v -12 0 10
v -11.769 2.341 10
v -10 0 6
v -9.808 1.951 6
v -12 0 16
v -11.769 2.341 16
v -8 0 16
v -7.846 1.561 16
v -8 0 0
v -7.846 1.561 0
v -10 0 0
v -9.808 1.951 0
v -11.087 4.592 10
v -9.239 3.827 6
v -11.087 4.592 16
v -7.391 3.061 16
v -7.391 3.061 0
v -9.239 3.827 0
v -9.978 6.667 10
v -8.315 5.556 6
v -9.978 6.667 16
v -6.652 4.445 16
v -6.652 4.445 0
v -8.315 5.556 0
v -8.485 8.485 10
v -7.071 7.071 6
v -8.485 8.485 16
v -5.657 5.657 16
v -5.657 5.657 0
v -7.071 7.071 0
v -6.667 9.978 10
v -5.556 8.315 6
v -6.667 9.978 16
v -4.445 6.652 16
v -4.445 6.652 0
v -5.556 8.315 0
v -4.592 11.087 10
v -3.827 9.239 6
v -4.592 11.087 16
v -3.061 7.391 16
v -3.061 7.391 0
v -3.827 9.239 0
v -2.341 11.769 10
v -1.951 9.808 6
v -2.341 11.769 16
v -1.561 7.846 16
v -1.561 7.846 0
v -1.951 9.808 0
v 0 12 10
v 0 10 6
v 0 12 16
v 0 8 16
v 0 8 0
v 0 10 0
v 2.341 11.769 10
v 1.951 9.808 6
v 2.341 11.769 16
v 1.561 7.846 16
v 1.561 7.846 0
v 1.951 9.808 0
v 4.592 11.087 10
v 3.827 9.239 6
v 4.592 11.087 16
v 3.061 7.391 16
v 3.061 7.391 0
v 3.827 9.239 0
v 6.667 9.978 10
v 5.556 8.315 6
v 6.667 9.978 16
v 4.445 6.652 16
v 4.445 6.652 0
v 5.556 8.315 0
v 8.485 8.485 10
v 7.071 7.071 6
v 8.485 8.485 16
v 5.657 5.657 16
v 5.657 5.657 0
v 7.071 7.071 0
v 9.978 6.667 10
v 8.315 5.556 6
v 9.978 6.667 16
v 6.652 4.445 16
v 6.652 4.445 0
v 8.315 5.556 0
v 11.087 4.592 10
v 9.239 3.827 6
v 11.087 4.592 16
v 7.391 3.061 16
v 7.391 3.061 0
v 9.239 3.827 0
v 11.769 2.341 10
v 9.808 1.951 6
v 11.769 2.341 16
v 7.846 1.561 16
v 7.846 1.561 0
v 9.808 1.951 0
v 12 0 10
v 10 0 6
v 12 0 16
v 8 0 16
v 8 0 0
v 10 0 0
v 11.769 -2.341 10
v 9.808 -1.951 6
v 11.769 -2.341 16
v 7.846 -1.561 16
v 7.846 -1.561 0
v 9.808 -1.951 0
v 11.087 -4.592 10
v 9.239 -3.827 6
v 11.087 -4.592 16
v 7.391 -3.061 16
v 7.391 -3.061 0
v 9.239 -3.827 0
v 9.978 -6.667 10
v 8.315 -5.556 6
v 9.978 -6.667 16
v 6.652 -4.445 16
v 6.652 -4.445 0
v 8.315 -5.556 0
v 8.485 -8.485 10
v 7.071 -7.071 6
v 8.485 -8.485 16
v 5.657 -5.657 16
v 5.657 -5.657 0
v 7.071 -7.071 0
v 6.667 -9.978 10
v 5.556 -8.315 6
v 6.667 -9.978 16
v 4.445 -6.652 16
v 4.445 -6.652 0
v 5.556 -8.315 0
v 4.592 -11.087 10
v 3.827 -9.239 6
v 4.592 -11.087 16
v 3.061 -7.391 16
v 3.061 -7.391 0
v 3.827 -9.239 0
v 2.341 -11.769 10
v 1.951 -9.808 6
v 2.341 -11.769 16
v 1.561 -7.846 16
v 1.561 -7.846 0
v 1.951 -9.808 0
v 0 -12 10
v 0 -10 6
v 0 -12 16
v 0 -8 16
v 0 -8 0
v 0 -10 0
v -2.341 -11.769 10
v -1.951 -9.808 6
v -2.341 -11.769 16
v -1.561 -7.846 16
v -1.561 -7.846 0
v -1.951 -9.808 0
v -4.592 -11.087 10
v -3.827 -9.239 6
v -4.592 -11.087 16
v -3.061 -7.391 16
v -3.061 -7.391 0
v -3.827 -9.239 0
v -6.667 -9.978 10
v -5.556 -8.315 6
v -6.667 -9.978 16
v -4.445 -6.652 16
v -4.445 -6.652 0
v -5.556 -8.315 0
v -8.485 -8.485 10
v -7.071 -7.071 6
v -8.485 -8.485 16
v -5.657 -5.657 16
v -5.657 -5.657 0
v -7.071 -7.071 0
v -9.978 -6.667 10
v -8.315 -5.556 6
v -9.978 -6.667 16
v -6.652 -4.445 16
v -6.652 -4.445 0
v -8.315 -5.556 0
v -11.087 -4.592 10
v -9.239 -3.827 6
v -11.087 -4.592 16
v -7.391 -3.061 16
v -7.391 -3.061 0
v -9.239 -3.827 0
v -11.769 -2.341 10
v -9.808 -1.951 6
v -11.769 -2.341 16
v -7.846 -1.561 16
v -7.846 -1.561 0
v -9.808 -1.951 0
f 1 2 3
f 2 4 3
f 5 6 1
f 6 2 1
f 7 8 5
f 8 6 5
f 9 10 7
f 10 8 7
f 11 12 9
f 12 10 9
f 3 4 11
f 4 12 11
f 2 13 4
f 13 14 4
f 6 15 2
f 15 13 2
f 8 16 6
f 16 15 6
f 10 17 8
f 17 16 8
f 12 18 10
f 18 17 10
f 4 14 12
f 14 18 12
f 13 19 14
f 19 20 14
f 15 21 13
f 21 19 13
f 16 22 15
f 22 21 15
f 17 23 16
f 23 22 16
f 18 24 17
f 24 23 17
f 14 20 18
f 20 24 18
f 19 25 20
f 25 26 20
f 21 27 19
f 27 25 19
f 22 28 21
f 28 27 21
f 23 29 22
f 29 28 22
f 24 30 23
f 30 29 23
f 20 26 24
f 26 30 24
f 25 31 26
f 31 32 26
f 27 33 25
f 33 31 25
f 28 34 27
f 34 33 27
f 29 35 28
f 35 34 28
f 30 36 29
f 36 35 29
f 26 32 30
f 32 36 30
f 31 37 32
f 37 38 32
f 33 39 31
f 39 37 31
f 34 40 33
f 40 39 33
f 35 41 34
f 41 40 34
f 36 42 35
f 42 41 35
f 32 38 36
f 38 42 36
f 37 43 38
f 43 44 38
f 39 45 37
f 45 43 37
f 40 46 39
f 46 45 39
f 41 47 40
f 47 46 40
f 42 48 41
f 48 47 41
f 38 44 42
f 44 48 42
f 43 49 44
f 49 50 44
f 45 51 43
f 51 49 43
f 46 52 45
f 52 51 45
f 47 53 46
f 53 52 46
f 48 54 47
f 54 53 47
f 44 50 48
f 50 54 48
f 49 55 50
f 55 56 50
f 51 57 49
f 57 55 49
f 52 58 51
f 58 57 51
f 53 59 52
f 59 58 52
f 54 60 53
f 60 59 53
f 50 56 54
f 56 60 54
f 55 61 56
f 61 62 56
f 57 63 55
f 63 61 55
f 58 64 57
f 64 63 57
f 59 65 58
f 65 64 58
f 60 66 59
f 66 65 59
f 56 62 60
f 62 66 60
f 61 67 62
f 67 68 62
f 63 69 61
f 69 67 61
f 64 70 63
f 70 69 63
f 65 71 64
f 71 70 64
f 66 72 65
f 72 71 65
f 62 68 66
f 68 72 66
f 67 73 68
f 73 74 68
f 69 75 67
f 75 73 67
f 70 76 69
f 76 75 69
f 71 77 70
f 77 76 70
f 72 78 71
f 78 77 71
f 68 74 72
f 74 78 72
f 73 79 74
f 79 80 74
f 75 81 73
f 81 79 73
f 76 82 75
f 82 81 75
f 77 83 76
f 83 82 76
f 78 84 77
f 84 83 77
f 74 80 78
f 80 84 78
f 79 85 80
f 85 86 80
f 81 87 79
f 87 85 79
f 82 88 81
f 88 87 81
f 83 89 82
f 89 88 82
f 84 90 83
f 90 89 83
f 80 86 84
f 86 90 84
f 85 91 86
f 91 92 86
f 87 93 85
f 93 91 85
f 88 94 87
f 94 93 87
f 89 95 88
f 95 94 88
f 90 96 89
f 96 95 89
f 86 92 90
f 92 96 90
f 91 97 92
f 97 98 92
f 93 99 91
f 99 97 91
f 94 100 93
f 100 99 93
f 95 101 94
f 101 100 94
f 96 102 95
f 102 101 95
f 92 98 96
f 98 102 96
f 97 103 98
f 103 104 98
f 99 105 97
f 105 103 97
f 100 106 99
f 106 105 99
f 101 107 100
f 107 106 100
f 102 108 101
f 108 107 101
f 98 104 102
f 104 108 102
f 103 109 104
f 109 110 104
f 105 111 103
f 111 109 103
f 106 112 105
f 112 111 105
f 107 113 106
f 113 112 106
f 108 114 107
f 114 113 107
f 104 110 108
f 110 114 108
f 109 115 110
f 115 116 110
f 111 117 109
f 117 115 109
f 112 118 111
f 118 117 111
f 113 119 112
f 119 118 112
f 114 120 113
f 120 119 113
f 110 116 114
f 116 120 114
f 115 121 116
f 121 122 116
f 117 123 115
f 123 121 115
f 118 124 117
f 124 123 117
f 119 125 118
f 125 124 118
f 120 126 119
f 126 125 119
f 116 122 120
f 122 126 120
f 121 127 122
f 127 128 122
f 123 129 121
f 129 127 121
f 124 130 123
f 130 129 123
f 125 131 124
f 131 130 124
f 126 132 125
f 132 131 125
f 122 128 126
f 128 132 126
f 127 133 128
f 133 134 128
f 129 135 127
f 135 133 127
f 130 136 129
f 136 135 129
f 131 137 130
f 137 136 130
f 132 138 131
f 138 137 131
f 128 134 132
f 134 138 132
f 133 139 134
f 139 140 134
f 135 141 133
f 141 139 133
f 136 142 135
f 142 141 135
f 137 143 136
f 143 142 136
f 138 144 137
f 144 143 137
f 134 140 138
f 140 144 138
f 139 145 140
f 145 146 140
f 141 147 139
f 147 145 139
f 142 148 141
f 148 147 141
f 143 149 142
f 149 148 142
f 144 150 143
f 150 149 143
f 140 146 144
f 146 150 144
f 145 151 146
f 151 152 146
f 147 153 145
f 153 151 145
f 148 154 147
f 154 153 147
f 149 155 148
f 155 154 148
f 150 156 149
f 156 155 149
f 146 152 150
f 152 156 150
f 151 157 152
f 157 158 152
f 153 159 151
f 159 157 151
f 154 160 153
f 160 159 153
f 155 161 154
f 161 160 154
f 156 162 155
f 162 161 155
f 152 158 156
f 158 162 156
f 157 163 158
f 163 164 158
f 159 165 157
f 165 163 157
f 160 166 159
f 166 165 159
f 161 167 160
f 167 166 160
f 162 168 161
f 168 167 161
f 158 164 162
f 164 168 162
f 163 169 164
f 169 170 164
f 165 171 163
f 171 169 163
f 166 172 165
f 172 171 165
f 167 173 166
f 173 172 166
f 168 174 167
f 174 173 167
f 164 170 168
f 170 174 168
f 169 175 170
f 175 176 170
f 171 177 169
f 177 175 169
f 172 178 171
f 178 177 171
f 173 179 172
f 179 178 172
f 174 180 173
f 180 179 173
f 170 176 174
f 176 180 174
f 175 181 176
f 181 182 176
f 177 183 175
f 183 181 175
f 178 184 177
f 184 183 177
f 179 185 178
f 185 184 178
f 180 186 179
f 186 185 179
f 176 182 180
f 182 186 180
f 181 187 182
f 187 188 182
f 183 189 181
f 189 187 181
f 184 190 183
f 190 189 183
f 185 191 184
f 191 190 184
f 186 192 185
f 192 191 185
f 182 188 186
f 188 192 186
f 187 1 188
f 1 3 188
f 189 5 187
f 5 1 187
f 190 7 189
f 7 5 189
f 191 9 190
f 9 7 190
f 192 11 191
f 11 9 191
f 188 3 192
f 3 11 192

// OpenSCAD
// A profile of straight segments revolved about the axis.
//
// This is the fixture for `rotate_extrude` declaring its own surfaces. Half of
// that item is free: revolving a *line segment* produces exactly the band the
// recogniser already handles - a cylinder where the segment is parallel to the
// axis, a frustum where it is tilted - so there is no emission work in it at
// all, only the record. The other half - an arc in the profile and the
// TOROIDAL_SURFACE it sweeps - is step-rounded-profile.scad, and it needed the
// profile to carry its arcs. This fixture stays deliberately straight-edged, so
// that what it measures is the segment case on its own.
//
// The profile is a stepped tube, chosen so that one fixture covers all three
// kinds of edge and the rim case that only appears between two curved faces:
//
//   (8,0)-(10,0)    at one height          a flat annulus, declares nothing
//   (10,0)-(10,6)   parallel to the axis   a cylinder, r=10
//   (10,6)-(12,10)  tilted                 a frustum: its cone, declared as a face,
//                                          and rims r=10 and r=12 as evidence
//   (12,10)-(12,16) parallel to the axis   a cylinder, r=12
//   (12,16)-(8,16)  at one height          a flat annulus, declares nothing
//   (8,16)-(8,0)    parallel to the axis   the bore, r=8
//
// Expected: four analytic faces - the r=8 bore, the r=10 wall, the cone between
// them, and the r=12 wall. The rim at z=6 and the rim at z=10 each bound two
// *curved* faces and nothing else, so they are written once and shared, the
// case step-chamfered-cylinder introduced. The two annuli and the two end faces
// stay planar.
//
// A twist, a helical v, or a Python profile_func would make each station a
// different profile, and none of this would be declared - which is correct, and
// is why a screw thread built that way stays faceted.
//
// Measured, and asserted by the driver: what the exporter has to report for
// the above to have happened. A silently faceted export is still a valid one,
// so validity alone cannot see a recogniser that has stopped recognising.
// Declared: the three cylinders r=8, 10 and 12 - both rim radii are walls as
// well, so neither is evidence only - and the cone. Until 2026-09-24 a tilted
// segment declared its rims and not its cone, and this read 3.
// EXPECT: 4 analytic surfaces available (3 cylindrical, 0 spherical, 0 toroidal, 0 Bezier, 1 conical)
// EXPECT: 4 surfaces recognised (0 toroidal, 0 spherical, 1 conical, 0 partial), 128 facets replaced
//
// pi times the integral of (r_out^2 - 64) dz over the profile: 216 for the
// straight r=10 run, 229 1/3 for the taper from 10 to 12, 480 for the r=12
// run, so pi*925 1/3.
// ROUNDTRIP: Cone=1 Cylinder=3 Plane=2
// VOLUME: 2907.0203975
$fn = 32;
rotate_extrude()
  polygon(points = [[8, 0], [10, 0], [10, 6], [12, 10], [12, 16], [8, 16]]);
